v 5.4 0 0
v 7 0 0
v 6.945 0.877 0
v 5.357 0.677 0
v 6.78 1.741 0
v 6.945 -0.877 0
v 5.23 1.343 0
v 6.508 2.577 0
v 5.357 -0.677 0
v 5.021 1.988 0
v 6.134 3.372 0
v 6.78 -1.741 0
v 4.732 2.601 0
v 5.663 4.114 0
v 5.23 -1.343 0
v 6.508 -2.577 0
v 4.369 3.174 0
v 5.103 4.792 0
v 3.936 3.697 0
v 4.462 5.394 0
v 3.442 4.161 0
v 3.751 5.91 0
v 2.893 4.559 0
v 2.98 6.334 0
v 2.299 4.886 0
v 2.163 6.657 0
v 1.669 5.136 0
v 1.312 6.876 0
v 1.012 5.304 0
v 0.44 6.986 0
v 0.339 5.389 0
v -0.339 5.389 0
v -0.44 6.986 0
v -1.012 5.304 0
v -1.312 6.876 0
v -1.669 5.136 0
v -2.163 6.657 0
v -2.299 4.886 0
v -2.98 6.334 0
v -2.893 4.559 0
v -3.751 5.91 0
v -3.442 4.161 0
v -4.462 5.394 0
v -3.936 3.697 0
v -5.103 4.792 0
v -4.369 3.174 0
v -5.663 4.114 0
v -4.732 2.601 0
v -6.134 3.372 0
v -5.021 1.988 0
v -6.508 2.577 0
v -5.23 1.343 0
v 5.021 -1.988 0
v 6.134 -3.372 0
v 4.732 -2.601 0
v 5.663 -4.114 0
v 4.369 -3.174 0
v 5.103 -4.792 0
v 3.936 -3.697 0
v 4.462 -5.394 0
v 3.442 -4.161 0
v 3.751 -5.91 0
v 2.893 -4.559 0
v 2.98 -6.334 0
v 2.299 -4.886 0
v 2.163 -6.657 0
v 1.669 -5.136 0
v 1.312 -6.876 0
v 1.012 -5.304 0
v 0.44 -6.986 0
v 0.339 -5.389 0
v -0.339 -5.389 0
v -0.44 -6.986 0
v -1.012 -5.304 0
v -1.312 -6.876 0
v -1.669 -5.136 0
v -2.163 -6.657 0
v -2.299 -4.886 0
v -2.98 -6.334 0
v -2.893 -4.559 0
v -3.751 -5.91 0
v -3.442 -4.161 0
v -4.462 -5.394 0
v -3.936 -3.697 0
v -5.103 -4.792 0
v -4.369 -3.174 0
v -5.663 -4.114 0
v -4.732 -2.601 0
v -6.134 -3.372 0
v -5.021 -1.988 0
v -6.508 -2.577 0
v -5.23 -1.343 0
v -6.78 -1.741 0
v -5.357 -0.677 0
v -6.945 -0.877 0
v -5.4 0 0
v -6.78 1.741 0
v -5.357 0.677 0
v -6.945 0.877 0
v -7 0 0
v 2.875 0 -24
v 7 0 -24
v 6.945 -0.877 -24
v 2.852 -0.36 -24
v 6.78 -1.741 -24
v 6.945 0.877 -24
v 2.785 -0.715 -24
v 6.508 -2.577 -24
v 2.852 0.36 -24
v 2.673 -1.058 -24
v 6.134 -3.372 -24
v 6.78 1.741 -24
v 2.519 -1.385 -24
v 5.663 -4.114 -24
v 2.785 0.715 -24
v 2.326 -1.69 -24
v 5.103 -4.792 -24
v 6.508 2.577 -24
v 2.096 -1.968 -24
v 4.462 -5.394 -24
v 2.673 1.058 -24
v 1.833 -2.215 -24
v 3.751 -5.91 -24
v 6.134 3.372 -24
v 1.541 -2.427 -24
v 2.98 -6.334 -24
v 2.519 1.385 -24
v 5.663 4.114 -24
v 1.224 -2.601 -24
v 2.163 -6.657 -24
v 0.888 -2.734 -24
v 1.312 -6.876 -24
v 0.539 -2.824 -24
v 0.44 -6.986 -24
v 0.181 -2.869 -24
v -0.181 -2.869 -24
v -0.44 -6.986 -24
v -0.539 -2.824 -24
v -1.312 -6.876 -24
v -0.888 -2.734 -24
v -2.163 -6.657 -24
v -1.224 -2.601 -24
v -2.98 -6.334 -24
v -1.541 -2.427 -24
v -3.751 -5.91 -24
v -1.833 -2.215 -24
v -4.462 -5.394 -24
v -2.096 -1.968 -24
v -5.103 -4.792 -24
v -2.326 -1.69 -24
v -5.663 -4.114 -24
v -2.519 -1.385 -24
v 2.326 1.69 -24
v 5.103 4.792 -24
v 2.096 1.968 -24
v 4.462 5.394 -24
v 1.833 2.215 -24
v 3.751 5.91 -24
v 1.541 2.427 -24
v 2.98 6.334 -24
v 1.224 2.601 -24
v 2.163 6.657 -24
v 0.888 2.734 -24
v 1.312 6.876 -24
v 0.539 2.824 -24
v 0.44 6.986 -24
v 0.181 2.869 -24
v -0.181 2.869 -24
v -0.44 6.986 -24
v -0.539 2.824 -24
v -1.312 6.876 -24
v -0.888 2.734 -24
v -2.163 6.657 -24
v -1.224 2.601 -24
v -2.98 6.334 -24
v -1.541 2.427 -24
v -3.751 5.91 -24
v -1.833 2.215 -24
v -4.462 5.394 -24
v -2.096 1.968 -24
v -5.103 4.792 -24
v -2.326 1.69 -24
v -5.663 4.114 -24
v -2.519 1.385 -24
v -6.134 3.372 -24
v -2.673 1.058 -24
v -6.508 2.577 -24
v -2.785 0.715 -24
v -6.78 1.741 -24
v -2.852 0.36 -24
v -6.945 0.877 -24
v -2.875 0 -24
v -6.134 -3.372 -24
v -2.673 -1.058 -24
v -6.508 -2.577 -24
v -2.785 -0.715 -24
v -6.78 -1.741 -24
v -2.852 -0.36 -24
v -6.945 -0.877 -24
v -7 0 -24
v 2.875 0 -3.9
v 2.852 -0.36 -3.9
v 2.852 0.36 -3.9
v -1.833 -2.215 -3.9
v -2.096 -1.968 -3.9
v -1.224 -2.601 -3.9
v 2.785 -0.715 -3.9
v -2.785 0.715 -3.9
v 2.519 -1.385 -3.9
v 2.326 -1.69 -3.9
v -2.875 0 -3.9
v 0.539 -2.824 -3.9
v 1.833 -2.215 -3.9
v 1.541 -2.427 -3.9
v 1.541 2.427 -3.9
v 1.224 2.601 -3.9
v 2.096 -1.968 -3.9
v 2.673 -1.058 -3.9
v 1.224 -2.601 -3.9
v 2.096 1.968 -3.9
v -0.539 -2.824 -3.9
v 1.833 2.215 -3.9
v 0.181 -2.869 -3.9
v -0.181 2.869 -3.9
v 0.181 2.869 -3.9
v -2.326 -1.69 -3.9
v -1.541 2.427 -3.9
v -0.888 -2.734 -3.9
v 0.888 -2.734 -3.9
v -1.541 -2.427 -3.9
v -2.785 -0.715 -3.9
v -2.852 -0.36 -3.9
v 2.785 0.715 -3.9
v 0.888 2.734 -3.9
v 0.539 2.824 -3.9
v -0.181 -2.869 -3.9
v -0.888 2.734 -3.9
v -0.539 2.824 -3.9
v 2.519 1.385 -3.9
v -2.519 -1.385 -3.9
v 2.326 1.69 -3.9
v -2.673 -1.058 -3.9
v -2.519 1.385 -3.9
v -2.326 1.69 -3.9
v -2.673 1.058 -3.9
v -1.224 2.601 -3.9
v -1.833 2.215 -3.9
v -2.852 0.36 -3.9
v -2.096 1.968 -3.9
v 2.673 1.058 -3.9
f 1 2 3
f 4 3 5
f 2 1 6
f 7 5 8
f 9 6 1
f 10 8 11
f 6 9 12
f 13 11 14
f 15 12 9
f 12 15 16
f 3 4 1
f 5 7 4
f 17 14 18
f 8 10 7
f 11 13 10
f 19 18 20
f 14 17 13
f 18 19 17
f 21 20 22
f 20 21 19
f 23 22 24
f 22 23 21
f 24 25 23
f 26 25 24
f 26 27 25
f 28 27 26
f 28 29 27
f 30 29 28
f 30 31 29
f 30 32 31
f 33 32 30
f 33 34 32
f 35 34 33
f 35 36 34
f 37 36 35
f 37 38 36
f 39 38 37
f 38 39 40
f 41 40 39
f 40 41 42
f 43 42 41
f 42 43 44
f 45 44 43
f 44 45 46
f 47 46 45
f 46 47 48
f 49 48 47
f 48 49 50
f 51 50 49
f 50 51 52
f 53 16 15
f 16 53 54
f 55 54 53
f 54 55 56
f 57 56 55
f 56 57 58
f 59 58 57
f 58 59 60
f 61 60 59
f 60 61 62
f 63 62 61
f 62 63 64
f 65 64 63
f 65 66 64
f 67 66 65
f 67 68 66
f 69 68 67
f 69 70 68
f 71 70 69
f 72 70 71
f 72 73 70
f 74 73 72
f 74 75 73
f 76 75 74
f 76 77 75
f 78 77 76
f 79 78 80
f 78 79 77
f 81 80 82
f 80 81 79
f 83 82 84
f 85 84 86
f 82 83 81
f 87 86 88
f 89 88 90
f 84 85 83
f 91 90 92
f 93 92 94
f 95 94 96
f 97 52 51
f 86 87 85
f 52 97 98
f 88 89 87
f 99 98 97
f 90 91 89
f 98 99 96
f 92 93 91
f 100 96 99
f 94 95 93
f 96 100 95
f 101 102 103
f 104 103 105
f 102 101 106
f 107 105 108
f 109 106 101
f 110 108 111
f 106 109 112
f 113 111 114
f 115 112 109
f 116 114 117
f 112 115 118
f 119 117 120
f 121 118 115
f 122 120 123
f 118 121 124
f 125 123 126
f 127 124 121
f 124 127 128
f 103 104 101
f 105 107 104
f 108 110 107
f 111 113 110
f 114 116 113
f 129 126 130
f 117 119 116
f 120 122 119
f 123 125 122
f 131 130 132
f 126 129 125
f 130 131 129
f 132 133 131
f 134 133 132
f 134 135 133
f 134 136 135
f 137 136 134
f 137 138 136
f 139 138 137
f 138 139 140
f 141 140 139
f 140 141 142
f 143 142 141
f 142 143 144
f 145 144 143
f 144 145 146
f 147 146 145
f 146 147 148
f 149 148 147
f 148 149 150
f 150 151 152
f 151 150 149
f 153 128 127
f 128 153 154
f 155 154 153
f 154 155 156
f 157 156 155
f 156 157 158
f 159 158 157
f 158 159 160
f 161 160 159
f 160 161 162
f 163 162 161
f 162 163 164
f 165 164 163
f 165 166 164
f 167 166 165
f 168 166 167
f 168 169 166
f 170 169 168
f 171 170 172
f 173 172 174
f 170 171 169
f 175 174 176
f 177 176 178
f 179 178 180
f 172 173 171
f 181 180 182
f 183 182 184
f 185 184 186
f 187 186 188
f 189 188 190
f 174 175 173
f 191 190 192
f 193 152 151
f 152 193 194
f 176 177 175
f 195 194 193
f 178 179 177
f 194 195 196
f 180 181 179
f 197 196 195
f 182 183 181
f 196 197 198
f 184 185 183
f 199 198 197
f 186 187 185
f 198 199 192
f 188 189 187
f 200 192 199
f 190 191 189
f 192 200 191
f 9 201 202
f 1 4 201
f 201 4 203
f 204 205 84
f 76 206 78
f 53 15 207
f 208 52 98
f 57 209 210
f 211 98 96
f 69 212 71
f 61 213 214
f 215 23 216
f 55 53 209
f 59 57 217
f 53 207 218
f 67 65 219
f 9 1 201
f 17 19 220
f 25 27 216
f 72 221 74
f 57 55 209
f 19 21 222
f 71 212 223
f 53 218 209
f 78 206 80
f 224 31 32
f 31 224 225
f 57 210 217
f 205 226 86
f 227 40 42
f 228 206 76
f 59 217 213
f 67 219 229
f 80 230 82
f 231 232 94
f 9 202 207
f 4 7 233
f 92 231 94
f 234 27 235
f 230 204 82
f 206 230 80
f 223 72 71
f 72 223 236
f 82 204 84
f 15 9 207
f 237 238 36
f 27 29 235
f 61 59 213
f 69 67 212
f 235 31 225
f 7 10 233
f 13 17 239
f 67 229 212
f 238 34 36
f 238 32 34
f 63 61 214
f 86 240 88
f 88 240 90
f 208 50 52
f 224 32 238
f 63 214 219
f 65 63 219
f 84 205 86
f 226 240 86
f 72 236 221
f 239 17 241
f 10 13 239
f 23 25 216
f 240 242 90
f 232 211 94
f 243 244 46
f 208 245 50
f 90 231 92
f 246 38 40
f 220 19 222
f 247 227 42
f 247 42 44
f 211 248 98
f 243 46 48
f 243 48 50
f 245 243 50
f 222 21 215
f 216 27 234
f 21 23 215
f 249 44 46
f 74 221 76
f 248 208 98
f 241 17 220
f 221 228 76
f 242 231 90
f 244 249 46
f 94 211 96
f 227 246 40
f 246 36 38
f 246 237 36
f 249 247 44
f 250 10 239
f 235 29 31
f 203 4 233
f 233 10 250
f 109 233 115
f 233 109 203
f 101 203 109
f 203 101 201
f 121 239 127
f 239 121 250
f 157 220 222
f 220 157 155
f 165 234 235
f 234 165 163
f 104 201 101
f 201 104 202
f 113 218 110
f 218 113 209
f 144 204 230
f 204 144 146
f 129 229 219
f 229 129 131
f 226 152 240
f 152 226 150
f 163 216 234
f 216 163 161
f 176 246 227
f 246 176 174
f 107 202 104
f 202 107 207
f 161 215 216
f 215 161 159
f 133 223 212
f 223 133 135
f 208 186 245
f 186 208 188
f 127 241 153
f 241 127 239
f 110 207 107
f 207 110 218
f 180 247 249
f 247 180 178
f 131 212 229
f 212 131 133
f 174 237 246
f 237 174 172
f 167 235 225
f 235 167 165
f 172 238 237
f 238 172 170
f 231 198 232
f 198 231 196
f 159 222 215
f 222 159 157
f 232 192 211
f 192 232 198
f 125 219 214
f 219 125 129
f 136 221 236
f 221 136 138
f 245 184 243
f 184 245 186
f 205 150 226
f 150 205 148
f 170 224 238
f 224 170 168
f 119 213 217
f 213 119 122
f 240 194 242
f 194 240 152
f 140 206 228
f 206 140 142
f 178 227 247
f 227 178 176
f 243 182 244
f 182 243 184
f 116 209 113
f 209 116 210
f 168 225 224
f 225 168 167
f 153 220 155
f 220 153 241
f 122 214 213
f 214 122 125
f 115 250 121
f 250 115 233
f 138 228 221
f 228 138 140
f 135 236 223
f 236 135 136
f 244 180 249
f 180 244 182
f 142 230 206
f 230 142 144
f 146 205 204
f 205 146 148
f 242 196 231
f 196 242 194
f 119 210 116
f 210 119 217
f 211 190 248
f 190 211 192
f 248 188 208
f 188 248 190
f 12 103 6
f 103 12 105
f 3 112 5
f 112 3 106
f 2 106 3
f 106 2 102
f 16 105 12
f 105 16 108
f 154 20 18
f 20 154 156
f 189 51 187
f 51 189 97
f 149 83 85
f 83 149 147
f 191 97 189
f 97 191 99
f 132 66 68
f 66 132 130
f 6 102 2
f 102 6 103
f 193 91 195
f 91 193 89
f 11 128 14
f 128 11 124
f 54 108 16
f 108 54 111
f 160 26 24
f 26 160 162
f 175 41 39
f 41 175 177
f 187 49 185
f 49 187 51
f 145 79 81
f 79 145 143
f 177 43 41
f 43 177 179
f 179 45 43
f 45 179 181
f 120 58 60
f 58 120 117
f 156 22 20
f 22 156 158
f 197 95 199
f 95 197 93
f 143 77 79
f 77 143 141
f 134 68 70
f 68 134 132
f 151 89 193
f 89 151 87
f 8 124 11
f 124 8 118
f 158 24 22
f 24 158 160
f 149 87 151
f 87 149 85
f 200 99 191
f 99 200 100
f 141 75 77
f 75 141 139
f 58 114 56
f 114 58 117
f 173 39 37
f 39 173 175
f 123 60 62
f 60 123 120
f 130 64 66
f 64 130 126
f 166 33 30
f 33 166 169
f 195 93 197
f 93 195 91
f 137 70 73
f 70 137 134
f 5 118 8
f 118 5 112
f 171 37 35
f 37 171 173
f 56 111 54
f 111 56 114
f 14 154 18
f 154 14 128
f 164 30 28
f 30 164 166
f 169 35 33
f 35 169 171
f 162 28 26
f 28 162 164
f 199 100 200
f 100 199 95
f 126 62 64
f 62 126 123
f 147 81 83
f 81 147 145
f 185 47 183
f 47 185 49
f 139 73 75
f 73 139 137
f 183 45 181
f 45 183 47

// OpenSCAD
$fn = 50;


difference() {
	union() {
		translate(v = [0, 0, -24.0000000000]) {
			cylinder(h = 24, r = 7.0000000000);
		}
		cylinder(h = 0, r = 10.0000000000);
	}
	union() {
		translate(v = [0, 0, 0]) {
			rotate(a = [0, 0, 0]) {
				difference() {
					union() {
						#translate(v = [0, 0, -24.0000000000]) {
							cylinder(h = 24, r = 2.6000000000);
						}
						#translate(v = [0, 0, -3.9000000000]) {
							cylinder(h = 3.9000000000, r1 = 2.8750000000, r2 = 5.4000000000);
						}
						#translate(v = [0, 0, -24.0000000000]) {
							cylinder(h = 24, r = 2.8750000000);
						}
						#translate(v = [0, 0, -24.0000000000]) {
							cylinder(h = 24, r = 2.6000000000);
						}
					}
					union();
				}
			}
		}
	}
}
